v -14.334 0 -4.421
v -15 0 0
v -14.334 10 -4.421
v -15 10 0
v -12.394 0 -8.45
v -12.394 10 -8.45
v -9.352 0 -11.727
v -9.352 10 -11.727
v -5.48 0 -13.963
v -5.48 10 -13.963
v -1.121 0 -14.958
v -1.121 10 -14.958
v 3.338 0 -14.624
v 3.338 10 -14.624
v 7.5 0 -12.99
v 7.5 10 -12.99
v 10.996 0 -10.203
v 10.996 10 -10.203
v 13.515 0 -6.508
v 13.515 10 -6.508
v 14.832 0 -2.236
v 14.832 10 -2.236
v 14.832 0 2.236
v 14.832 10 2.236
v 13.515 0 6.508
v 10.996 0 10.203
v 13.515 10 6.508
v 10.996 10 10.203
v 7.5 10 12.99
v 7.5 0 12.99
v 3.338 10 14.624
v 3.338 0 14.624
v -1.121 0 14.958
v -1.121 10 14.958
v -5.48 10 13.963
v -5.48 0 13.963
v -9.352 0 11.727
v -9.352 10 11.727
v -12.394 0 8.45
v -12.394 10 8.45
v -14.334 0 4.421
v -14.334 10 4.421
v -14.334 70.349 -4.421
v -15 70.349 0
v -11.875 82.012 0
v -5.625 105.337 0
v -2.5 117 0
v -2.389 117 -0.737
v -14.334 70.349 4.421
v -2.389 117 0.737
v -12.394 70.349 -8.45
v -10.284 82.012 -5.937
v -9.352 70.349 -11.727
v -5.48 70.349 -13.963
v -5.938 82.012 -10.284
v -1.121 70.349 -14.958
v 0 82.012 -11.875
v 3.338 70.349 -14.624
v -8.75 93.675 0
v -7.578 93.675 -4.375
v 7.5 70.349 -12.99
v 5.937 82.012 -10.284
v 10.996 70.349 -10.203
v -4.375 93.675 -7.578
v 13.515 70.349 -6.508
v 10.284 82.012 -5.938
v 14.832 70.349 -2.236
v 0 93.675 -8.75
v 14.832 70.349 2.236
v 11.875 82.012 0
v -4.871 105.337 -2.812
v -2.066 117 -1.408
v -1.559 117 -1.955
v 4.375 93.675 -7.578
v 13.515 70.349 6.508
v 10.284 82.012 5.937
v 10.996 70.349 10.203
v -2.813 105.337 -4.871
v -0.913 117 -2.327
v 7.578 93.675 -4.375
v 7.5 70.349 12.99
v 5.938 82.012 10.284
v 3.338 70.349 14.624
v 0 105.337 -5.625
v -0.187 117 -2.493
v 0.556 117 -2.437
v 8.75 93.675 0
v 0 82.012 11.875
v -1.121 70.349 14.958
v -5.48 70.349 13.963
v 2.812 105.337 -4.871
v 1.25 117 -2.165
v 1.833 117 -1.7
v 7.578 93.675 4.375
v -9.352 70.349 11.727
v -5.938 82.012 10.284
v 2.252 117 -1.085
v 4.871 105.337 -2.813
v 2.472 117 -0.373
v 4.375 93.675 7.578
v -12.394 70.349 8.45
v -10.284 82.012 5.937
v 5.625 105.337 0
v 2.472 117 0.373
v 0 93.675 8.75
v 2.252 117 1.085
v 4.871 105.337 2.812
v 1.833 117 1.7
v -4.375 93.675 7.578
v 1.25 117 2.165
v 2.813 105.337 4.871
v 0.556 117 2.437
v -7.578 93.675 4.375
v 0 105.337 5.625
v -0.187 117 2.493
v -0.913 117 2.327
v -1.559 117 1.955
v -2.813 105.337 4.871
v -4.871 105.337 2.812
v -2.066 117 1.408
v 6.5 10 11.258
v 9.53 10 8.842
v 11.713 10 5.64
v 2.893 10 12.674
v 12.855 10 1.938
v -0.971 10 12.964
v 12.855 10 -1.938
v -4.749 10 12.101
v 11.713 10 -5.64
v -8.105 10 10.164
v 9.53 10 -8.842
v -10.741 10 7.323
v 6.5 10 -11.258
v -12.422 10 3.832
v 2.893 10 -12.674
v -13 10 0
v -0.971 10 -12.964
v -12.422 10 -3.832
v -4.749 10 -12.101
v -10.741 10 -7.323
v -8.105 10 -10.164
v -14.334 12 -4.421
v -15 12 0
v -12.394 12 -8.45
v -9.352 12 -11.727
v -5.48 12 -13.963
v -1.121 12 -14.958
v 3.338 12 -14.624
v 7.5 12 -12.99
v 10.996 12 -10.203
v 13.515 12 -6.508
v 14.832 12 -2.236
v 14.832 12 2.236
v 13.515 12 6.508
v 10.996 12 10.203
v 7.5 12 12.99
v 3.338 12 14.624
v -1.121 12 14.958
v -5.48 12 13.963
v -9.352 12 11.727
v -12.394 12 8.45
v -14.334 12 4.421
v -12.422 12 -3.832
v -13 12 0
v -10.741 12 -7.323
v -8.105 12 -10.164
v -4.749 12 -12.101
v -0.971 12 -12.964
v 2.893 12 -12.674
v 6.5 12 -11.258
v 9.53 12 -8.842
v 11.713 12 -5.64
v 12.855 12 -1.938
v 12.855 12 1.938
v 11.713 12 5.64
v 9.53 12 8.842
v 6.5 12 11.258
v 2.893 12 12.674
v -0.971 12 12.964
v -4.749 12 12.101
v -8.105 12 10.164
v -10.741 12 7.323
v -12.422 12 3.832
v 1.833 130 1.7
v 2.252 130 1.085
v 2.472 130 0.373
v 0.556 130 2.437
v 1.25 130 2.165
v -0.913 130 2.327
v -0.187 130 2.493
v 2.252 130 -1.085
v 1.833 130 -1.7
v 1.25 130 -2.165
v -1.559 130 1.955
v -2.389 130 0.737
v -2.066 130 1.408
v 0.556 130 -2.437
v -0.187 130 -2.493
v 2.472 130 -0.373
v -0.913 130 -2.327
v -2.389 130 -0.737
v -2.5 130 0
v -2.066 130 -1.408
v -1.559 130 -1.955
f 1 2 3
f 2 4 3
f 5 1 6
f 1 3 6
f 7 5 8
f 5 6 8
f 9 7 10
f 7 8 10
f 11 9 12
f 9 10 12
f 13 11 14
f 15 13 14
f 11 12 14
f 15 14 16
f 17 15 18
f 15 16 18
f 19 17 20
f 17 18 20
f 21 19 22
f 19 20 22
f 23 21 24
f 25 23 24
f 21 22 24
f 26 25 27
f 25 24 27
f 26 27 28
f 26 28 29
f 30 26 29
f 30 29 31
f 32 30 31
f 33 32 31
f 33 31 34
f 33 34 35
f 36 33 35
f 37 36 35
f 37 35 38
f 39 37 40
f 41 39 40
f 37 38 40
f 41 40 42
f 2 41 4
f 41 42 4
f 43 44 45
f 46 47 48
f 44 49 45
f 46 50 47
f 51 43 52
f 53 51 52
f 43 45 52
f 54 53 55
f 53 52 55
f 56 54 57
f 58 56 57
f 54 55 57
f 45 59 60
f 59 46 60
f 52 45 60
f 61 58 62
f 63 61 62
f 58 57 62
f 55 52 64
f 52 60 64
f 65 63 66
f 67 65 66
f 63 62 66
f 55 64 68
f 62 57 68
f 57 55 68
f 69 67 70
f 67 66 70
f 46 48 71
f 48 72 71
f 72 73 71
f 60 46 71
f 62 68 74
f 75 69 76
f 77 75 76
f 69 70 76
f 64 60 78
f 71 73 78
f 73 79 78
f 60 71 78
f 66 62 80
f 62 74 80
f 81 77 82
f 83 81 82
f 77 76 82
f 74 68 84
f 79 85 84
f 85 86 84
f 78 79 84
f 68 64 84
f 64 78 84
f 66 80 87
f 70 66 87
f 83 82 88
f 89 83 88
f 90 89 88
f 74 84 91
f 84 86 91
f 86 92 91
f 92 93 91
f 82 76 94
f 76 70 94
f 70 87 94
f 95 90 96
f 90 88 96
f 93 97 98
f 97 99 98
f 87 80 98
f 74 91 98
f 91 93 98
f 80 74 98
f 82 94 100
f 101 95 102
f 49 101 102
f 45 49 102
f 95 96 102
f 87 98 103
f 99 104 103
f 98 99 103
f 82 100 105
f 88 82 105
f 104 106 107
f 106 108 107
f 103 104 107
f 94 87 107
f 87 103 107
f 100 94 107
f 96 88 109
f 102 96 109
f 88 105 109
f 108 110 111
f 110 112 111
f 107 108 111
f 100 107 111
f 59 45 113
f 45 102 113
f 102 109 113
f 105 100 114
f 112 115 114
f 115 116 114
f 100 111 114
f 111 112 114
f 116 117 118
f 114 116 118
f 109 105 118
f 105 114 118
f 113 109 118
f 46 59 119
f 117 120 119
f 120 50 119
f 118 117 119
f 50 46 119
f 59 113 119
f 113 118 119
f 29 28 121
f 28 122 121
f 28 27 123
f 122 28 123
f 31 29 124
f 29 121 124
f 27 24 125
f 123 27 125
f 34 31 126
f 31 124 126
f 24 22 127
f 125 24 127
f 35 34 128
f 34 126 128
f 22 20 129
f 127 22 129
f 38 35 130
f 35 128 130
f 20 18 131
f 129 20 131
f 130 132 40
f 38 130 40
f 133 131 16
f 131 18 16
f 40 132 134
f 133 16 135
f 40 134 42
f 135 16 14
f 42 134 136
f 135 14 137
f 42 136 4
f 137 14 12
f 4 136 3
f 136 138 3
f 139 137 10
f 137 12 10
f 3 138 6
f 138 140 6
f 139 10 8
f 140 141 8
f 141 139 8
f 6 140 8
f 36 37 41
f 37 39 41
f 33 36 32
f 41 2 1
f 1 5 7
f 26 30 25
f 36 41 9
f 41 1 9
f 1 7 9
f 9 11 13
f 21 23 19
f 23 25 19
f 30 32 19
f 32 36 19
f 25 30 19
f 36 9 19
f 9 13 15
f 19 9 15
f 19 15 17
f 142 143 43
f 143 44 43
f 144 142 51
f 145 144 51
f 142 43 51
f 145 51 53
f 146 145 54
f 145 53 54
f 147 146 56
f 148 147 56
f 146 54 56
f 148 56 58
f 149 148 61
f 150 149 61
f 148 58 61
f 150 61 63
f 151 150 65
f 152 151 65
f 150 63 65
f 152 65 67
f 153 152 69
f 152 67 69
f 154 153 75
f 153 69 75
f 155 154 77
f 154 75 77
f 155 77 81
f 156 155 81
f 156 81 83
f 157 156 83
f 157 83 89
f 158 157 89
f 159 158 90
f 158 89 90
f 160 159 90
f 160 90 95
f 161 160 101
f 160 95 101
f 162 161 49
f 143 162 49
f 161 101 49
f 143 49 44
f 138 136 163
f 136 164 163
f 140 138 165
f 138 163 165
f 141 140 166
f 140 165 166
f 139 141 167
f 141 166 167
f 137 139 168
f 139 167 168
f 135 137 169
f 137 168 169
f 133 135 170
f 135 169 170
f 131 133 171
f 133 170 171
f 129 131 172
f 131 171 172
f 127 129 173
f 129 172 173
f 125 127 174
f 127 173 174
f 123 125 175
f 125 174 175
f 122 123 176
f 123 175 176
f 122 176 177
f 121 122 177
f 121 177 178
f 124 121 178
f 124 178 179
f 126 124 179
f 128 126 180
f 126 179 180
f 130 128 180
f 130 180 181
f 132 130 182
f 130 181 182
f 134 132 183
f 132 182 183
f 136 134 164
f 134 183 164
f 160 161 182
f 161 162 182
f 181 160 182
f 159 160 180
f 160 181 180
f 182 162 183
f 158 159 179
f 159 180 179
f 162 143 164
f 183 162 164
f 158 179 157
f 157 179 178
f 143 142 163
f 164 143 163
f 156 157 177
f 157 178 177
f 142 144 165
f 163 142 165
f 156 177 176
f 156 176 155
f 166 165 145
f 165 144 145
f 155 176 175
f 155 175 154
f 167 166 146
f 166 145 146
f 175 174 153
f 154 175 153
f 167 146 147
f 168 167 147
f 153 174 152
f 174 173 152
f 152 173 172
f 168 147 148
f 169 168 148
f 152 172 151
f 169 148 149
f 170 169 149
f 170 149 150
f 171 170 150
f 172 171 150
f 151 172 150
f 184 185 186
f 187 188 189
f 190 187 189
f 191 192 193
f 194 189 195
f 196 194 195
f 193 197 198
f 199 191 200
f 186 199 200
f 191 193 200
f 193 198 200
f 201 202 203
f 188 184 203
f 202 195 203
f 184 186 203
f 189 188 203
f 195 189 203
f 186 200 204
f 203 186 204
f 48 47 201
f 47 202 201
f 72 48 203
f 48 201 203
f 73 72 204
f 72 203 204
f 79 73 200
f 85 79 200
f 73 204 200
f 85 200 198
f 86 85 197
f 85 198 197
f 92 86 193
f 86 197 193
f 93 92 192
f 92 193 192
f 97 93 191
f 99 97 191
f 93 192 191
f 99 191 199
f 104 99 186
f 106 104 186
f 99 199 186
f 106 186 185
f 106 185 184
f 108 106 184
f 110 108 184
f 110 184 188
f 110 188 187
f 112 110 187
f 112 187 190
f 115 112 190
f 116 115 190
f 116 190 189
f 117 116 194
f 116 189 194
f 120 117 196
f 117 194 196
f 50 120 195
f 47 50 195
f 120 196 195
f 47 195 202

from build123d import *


with BuildPart() as part:
    # Croquis1 → Revolución1 (revolve)
    with BuildSketch(Plane.XY, mode=Mode.PRIVATE) as revoluci_n1_sk:
        Polygon((0, 130), (0, 0), (15, 0), (15, 10), (13, 10), (13, 12), (15, 12), (15, 70.349364905), (2.5, 117), (2.5, 130), align=None)
    revolve(revoluci_n1_sk.sketch.rotate(Axis((0, 130, 0), (0, -1, 0)), 180), axis=Axis((0, 130, 0), (0, -1, 0)))


solid = part.part
